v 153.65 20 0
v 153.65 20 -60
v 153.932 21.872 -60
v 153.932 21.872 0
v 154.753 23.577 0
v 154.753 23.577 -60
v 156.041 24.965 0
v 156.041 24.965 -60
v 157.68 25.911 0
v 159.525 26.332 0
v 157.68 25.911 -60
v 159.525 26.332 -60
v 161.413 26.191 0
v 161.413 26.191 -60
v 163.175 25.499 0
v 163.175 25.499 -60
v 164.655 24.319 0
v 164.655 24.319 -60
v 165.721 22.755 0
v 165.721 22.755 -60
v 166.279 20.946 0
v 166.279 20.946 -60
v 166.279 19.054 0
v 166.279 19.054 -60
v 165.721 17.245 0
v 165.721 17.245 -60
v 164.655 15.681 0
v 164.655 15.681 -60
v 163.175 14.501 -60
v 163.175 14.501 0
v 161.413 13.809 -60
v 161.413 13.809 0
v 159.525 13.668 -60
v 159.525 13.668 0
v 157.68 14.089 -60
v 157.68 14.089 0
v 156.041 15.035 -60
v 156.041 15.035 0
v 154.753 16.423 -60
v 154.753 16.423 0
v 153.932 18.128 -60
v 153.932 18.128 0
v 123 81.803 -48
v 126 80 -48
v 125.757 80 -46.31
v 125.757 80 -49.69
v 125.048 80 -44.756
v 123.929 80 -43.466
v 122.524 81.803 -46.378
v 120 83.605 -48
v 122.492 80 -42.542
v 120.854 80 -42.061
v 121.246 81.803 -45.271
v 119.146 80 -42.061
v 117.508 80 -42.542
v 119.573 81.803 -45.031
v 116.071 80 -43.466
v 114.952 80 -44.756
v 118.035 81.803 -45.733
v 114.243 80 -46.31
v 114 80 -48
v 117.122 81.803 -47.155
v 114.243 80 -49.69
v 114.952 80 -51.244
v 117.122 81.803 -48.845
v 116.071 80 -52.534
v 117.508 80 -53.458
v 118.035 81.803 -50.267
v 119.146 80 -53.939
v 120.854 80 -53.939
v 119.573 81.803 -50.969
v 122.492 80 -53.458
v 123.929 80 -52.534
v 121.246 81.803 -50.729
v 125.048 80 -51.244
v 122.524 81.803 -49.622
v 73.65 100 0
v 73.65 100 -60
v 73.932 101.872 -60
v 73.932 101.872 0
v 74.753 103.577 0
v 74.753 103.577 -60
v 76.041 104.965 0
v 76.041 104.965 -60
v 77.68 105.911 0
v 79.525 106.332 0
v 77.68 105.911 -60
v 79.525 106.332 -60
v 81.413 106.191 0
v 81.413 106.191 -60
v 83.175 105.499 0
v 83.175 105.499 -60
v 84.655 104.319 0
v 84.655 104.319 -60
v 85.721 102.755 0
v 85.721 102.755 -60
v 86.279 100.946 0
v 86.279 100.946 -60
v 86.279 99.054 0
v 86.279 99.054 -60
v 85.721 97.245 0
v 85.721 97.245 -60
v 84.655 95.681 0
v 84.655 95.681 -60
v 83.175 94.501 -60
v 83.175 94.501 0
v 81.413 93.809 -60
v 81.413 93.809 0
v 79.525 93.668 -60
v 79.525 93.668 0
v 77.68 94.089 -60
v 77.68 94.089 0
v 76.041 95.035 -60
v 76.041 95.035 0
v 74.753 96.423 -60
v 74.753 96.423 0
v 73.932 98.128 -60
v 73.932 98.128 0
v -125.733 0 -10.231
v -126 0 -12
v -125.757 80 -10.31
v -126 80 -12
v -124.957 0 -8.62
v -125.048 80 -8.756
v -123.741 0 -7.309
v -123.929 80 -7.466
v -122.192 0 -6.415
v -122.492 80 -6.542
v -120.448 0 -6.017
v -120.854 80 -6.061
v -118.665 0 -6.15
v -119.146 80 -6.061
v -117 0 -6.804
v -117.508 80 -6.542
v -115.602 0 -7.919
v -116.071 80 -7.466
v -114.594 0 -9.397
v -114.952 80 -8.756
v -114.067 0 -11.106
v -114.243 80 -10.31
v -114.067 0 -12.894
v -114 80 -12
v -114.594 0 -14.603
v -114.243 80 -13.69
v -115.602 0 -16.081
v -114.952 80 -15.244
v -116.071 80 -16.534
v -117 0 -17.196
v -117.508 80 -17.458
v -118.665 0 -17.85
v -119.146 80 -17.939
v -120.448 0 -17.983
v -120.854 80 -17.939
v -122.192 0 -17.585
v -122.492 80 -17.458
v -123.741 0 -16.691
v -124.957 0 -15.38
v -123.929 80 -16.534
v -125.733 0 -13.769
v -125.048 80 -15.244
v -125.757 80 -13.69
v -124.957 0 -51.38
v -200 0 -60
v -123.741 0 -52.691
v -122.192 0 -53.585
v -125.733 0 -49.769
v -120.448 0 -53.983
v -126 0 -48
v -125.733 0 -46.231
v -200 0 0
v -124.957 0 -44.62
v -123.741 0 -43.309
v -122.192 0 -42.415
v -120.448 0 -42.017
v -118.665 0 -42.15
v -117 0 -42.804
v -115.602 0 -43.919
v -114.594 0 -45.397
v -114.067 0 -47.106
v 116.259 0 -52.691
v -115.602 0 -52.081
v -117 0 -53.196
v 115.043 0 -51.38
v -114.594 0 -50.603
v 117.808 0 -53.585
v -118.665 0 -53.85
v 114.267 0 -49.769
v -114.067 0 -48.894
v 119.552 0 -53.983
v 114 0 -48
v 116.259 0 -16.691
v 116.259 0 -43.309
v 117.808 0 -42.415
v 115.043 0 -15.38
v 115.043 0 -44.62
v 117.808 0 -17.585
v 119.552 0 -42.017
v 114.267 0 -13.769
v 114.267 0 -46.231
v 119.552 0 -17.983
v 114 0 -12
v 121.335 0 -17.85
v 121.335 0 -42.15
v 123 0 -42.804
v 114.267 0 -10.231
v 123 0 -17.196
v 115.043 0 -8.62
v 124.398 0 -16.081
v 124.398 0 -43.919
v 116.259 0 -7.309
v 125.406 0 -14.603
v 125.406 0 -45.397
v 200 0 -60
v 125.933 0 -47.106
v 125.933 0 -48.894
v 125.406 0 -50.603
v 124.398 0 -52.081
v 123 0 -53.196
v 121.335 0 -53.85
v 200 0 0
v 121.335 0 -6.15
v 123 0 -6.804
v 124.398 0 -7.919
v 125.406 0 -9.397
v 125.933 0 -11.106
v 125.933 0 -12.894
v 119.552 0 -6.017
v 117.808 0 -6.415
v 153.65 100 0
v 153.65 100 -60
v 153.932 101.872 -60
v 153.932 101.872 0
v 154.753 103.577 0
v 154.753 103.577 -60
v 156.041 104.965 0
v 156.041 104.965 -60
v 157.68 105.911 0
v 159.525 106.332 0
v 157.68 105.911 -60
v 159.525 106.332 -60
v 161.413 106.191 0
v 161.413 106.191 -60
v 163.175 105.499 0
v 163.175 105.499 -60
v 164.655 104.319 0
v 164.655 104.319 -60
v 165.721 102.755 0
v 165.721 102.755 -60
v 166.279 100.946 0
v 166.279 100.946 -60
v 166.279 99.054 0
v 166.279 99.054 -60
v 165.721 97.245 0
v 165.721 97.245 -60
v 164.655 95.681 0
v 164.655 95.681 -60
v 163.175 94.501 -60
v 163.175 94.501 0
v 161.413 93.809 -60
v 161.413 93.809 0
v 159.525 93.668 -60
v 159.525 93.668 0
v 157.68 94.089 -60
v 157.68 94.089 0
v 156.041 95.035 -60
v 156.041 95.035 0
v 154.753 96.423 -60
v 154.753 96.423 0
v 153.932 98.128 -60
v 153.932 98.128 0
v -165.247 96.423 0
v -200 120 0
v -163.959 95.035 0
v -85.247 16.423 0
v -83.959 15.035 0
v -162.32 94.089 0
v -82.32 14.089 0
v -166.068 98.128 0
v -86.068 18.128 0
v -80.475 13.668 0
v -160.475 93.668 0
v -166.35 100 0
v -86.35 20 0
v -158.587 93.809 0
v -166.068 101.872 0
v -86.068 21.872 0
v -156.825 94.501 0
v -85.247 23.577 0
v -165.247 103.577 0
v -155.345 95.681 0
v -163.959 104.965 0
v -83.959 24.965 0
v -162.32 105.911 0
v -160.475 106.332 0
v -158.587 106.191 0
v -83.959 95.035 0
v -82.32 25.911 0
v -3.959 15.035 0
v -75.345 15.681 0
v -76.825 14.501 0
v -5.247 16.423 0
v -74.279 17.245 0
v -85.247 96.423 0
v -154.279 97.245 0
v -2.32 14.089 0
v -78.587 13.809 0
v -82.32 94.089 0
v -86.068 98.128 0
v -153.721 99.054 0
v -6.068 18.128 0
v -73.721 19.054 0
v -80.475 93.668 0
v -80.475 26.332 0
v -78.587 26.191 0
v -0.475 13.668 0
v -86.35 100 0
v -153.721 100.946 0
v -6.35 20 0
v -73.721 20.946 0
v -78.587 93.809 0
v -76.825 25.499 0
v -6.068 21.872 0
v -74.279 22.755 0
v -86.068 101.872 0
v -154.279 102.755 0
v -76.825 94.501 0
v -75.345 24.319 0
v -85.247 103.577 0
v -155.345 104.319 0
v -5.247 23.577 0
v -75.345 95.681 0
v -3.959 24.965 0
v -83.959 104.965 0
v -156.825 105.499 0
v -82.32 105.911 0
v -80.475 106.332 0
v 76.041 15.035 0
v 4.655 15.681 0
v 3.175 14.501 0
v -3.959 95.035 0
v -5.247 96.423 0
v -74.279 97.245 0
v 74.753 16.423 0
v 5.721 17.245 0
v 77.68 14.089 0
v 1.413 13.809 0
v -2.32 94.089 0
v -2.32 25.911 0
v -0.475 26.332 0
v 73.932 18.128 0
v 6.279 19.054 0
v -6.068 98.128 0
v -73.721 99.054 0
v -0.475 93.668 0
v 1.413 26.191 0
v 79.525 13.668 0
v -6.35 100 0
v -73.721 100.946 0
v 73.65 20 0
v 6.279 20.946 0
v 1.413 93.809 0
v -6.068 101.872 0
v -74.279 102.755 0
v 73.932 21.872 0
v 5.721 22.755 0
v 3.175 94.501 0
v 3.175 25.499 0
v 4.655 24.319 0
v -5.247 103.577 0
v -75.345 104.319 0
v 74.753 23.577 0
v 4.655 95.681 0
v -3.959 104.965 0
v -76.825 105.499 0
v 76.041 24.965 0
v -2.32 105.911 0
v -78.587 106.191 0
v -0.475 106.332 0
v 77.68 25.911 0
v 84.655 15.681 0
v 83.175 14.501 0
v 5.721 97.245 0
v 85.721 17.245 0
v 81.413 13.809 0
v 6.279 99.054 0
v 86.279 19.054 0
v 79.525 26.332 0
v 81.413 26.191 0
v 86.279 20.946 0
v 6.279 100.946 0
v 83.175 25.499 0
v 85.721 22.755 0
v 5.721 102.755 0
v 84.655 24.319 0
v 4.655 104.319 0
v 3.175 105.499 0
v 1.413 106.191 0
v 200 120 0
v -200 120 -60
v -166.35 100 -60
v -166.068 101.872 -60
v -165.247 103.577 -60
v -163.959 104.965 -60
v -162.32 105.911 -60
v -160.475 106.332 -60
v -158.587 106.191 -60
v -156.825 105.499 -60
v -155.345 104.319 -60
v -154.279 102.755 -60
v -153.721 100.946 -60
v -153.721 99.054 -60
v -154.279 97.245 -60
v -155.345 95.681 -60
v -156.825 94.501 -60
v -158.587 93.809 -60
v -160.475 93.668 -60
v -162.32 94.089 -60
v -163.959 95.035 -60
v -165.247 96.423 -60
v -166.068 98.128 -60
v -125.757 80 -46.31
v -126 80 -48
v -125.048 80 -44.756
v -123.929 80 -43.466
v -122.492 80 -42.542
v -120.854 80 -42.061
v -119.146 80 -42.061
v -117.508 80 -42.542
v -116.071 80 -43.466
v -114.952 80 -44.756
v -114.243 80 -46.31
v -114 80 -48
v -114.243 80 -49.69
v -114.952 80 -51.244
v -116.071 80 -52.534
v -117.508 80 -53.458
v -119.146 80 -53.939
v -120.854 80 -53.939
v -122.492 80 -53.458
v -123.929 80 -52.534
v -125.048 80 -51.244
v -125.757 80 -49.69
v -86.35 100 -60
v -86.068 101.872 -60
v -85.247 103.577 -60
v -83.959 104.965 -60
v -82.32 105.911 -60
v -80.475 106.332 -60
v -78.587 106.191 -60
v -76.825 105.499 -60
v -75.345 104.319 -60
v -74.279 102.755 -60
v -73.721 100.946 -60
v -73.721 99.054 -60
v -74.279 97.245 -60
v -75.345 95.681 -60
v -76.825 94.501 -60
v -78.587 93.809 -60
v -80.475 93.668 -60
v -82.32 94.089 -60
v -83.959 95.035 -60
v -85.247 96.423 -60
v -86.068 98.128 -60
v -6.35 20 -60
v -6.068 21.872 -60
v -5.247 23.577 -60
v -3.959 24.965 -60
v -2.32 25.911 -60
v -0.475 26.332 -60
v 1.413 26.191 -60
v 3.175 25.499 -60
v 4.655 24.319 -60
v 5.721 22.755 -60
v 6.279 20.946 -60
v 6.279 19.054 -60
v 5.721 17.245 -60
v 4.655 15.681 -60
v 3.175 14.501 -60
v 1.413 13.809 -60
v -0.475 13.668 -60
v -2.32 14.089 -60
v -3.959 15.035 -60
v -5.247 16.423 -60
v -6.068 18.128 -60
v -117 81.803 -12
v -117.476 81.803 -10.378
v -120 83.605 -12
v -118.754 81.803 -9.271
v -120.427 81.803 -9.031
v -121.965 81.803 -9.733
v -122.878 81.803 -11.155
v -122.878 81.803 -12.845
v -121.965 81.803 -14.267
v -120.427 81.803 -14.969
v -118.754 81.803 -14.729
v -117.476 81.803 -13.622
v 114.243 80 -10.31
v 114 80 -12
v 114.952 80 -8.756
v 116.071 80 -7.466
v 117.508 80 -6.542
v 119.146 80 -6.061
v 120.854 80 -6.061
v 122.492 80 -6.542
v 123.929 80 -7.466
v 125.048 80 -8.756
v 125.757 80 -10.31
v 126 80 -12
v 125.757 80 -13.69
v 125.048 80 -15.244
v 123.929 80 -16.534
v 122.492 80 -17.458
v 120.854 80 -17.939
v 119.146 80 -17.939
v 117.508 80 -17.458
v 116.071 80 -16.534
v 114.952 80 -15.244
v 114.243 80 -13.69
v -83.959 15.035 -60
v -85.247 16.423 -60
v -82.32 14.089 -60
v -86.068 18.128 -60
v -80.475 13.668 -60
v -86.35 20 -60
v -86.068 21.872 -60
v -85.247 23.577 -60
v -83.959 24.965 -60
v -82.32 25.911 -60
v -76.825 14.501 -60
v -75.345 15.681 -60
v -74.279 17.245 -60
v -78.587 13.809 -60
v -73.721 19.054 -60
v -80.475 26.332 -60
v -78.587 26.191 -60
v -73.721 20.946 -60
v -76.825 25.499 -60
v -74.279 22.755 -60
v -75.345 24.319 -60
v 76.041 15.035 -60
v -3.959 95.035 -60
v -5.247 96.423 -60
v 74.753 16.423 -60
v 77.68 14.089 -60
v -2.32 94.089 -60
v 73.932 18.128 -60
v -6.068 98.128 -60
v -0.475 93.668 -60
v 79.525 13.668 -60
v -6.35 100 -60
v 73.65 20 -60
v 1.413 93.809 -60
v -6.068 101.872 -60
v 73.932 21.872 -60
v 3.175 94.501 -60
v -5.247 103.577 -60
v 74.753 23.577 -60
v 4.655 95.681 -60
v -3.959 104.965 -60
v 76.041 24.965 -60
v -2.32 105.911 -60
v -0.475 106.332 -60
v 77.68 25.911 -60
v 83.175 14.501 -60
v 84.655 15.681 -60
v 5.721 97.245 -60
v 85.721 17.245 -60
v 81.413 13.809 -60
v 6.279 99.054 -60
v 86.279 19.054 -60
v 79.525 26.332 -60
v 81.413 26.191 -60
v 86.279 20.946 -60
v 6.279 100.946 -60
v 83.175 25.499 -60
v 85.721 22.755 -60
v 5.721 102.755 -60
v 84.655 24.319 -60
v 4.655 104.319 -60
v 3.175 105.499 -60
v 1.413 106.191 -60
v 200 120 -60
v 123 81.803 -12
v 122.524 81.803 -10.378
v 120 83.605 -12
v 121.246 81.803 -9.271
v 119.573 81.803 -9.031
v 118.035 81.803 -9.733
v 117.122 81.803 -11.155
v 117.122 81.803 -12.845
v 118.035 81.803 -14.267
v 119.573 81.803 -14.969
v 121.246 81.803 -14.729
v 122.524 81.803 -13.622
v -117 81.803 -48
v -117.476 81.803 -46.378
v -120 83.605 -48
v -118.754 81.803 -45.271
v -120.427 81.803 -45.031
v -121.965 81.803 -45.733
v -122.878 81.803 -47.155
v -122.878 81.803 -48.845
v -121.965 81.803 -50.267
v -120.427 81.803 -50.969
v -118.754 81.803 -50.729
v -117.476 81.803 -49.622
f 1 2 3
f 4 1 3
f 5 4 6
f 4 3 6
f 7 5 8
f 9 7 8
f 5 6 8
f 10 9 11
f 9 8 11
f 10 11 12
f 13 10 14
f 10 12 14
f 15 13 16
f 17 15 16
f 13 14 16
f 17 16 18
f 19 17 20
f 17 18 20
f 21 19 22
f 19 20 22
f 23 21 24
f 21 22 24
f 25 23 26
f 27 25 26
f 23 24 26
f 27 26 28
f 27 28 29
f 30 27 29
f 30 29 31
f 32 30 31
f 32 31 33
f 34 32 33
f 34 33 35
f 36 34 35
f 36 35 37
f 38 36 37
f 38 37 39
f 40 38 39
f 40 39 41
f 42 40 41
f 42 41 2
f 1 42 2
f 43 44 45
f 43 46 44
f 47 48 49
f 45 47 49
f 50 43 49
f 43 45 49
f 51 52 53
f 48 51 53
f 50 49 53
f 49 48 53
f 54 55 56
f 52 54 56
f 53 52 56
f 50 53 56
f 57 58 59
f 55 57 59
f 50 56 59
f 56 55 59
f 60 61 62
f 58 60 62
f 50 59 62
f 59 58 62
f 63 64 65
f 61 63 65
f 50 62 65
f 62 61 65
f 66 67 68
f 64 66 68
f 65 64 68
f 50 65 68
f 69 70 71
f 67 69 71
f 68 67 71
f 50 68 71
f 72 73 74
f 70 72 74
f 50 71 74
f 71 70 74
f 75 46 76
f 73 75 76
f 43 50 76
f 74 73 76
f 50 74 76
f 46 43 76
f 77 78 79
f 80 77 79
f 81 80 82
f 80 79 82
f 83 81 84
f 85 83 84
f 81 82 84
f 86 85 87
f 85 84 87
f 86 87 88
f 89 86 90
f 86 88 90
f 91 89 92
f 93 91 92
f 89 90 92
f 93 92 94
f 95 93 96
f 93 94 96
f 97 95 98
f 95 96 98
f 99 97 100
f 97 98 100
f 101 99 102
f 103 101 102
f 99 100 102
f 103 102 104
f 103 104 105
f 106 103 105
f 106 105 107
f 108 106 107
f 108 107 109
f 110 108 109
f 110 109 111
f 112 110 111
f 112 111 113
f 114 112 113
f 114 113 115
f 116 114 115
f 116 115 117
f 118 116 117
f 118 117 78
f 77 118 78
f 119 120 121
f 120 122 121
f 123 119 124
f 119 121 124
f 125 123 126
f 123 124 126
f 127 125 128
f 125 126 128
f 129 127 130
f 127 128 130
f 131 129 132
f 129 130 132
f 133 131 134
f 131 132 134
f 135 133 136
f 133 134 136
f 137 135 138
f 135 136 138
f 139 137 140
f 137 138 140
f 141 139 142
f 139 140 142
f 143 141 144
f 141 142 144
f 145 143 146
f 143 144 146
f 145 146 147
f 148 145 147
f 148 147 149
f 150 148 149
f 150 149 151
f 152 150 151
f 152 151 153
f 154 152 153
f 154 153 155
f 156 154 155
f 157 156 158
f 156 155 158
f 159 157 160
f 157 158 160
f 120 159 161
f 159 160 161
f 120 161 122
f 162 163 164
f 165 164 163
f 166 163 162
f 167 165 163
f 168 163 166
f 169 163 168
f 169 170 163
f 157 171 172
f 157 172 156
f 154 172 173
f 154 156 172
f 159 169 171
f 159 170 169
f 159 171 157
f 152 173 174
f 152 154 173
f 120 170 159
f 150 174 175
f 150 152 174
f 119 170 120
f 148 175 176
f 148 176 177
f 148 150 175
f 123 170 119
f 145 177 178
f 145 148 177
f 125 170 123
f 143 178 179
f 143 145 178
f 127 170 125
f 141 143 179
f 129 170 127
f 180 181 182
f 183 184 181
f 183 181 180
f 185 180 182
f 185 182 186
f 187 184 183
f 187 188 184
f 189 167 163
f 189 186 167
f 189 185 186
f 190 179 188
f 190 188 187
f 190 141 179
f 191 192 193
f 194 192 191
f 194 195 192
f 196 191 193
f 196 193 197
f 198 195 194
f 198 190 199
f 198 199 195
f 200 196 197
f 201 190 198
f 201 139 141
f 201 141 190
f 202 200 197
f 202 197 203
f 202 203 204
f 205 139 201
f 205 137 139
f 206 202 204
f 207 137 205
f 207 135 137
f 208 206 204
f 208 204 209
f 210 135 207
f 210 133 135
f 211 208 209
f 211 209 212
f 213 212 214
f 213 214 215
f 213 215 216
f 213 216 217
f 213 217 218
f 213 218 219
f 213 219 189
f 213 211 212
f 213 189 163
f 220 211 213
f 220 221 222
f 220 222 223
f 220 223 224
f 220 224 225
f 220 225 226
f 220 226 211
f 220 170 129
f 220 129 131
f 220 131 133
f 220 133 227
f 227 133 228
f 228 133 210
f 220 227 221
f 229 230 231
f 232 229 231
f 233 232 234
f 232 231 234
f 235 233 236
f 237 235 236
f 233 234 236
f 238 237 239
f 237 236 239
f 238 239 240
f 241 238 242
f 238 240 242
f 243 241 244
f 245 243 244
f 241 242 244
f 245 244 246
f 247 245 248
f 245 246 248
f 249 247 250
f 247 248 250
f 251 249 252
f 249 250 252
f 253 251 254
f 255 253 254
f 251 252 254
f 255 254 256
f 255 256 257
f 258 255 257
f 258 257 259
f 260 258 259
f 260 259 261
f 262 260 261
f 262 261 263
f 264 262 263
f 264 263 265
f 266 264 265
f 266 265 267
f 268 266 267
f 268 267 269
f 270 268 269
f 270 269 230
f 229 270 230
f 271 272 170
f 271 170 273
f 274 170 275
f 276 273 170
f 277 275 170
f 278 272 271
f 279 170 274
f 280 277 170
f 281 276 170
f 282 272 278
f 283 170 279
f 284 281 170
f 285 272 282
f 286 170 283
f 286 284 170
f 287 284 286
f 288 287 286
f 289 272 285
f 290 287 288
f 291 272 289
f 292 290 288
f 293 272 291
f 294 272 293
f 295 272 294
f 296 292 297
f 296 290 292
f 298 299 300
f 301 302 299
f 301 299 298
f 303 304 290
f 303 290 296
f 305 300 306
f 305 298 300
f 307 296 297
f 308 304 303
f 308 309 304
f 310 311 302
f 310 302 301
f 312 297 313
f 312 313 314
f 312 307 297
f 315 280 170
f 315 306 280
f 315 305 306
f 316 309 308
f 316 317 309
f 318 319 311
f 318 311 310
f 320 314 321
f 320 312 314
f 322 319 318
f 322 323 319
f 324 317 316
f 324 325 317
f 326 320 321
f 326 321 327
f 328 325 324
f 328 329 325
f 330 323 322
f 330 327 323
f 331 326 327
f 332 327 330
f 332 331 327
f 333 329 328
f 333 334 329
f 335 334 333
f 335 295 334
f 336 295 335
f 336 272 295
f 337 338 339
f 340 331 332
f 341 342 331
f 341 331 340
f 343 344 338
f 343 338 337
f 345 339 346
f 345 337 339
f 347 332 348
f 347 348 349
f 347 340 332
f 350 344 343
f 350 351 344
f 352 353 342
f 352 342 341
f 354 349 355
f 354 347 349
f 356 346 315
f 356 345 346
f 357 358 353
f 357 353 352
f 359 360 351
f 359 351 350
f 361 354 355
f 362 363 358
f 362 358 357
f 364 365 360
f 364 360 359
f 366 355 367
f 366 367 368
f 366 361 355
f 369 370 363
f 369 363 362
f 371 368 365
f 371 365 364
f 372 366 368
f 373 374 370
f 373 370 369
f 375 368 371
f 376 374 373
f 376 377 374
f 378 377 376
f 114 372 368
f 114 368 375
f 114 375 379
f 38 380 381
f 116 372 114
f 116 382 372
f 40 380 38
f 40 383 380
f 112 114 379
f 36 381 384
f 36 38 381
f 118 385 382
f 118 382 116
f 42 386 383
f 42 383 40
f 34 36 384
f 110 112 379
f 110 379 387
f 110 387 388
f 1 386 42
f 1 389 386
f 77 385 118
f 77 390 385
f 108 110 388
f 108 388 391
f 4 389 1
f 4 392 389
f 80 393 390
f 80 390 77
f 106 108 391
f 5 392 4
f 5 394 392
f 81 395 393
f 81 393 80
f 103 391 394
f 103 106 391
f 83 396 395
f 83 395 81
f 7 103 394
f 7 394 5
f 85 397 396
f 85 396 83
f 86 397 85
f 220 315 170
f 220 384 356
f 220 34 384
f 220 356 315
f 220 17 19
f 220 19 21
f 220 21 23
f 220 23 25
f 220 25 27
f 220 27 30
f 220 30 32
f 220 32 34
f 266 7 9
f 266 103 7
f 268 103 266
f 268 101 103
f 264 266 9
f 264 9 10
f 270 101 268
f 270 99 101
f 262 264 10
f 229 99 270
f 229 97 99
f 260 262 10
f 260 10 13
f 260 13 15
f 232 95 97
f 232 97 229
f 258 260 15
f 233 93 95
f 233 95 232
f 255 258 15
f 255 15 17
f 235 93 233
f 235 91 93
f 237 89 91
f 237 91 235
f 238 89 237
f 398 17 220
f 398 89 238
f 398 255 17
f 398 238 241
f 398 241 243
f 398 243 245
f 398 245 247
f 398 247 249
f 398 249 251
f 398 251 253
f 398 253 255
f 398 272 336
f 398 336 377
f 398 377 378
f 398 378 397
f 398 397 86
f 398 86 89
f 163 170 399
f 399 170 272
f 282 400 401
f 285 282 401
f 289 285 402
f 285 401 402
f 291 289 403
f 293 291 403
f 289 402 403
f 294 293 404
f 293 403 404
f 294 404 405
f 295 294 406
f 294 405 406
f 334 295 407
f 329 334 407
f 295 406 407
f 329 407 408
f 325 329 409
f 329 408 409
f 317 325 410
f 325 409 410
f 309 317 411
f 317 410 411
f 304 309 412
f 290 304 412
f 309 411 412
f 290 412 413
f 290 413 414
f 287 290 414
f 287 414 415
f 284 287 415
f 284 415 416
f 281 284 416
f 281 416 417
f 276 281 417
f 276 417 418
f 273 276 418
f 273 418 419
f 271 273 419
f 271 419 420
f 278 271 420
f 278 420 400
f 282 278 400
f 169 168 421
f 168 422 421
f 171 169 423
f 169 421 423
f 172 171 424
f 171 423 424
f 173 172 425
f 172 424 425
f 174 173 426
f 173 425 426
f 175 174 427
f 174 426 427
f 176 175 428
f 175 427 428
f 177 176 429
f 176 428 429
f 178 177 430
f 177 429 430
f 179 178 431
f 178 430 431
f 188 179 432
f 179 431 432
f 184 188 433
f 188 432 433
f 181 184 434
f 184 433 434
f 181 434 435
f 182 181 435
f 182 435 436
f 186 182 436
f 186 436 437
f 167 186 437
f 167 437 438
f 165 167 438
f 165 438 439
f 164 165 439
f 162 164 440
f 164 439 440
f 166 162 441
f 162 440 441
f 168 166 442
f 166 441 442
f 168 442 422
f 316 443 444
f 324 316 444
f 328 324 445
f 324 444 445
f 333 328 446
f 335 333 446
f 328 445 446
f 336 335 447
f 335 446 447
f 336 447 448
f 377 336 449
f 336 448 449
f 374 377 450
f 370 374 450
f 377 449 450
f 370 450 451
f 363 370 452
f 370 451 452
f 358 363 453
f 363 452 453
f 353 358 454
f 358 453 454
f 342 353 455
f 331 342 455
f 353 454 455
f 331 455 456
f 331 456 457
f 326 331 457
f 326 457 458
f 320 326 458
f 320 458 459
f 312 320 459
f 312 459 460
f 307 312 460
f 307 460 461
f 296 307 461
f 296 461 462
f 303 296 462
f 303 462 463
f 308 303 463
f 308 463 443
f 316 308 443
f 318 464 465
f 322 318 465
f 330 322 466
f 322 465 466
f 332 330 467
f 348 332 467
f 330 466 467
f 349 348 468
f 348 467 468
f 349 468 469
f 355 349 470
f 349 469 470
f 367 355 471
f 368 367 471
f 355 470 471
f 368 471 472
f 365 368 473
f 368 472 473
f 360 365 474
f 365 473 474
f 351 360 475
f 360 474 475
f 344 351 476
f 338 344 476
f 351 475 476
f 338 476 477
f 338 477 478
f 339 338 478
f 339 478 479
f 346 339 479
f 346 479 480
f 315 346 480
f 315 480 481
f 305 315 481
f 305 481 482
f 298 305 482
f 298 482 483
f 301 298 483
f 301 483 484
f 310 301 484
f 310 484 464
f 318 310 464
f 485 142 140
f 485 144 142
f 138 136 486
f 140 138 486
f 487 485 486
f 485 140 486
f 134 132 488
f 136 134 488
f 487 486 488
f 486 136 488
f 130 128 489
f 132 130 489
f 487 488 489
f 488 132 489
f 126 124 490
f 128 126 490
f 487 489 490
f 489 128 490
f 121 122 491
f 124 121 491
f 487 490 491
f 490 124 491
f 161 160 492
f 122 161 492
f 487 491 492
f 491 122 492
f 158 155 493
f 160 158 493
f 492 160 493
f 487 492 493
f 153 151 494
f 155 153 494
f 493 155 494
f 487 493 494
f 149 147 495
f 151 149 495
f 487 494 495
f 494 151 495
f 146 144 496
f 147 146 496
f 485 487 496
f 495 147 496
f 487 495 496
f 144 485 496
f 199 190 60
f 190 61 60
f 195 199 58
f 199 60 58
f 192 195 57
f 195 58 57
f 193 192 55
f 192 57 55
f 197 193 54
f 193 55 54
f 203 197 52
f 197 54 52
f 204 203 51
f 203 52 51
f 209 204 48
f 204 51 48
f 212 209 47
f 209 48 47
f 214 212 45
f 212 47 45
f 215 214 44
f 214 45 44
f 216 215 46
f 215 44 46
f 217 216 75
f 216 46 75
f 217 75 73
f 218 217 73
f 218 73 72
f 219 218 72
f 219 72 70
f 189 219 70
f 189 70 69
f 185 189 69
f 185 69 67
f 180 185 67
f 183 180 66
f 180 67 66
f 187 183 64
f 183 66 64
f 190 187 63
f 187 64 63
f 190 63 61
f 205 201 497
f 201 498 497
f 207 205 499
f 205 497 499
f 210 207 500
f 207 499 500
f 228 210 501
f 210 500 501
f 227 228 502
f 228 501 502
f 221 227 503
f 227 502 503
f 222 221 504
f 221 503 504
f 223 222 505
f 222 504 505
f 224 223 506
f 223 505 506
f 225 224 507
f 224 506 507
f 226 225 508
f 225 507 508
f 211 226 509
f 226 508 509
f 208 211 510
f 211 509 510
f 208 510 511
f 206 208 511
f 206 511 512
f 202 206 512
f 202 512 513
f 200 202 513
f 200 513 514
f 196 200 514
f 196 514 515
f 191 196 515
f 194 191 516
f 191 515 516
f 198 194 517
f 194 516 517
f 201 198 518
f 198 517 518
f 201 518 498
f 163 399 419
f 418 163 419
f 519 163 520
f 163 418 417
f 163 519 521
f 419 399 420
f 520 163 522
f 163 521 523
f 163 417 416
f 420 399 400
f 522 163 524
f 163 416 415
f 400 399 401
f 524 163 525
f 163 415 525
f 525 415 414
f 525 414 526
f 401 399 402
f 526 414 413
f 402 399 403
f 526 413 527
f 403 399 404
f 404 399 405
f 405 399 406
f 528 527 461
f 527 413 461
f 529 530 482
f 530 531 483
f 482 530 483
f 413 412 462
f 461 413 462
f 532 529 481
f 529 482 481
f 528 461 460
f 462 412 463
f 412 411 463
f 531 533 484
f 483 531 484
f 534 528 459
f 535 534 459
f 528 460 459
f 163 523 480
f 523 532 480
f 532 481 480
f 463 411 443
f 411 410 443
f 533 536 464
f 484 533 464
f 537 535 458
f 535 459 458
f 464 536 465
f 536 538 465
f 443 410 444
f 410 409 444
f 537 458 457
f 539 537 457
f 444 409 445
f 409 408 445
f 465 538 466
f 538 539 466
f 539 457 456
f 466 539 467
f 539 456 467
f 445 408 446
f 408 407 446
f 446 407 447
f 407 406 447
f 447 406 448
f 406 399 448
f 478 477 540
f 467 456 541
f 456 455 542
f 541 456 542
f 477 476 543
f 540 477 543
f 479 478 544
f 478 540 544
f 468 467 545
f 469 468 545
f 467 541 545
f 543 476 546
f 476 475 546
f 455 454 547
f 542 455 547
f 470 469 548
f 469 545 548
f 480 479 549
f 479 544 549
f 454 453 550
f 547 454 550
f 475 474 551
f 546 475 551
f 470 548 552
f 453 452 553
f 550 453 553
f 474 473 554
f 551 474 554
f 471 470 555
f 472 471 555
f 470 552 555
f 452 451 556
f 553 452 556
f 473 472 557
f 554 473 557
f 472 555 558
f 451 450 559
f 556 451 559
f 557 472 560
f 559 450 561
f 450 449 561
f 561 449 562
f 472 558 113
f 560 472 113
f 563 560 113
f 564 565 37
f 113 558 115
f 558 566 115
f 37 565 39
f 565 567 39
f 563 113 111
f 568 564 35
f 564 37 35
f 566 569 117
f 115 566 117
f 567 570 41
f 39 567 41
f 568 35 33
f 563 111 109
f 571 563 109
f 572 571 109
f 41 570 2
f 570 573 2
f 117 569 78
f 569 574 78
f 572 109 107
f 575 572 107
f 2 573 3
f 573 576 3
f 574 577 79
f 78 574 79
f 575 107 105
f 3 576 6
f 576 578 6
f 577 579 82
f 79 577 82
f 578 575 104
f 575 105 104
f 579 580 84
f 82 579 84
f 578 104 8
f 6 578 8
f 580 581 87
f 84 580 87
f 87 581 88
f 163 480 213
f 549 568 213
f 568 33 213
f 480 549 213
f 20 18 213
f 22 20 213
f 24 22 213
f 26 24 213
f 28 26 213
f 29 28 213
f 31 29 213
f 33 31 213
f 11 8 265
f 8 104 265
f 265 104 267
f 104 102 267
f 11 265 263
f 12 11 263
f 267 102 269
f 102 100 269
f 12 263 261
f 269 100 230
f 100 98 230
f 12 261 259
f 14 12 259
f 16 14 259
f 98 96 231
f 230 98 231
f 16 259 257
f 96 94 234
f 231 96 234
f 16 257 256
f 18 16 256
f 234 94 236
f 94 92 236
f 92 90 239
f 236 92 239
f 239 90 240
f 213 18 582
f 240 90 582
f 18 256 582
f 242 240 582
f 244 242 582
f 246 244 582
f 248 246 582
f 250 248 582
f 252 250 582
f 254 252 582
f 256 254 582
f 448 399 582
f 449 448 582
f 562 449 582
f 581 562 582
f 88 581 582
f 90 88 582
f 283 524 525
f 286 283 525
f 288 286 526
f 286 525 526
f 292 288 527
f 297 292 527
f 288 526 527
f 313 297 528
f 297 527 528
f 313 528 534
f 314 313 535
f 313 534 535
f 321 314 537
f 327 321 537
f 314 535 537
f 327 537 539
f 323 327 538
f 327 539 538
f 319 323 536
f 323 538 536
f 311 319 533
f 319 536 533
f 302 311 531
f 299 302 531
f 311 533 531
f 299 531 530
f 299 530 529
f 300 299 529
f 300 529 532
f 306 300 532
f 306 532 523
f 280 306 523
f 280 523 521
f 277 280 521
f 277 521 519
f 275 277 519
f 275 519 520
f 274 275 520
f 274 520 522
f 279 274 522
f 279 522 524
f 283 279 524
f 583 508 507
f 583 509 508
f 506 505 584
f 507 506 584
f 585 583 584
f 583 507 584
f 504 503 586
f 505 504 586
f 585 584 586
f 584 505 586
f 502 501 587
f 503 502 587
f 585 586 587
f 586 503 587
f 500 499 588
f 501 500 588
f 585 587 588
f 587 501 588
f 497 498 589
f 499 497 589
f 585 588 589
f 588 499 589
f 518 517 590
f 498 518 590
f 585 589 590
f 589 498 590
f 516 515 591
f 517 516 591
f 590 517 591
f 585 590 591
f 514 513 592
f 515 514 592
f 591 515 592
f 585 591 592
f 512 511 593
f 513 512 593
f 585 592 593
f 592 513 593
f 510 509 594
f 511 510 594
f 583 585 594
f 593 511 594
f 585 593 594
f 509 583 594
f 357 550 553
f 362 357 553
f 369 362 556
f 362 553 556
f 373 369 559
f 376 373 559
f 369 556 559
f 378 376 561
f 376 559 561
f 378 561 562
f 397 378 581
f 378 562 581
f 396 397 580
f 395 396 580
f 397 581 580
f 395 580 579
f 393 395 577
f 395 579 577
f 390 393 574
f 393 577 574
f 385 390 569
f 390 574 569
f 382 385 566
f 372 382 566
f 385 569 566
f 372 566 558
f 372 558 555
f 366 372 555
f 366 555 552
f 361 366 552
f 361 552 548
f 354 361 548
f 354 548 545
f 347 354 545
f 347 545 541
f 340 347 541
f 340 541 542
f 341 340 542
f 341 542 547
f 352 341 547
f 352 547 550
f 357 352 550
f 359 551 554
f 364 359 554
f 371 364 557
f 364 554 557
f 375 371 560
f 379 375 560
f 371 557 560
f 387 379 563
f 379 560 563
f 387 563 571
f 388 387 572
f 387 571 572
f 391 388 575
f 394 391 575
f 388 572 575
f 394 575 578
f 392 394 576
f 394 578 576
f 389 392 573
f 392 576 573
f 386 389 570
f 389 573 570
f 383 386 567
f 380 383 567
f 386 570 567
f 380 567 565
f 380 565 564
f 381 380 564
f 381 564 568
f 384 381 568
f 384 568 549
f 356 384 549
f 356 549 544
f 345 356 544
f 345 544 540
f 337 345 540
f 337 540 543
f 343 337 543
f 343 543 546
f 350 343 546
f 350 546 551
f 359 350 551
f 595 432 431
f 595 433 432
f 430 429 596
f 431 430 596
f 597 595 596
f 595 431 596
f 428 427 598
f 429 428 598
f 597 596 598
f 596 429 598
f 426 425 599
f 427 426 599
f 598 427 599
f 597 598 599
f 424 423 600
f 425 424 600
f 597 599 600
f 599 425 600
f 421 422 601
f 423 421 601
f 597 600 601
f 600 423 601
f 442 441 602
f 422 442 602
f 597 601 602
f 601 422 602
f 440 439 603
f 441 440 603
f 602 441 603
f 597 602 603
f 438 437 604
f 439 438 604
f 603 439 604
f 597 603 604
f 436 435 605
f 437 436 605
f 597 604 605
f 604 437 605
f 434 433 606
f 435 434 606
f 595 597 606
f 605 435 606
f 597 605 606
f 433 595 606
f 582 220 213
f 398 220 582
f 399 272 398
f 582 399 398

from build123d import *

# Parameters (mm, degrees)
F0_W     = 400
F0_H     = 120
F0_R     = 12.7
F0_R_2   = 6.35
F1_DEPTH = 60
F3_D     = 12
F3_DEPTH = 80
F3_TIP   = 3.6051637142
F4_D     = 12.7


with BuildPart() as f1:
    # F0 (on Top) → F1 (new body)
    with BuildSketch(Plane.XY):
        with Locations((0, 60)):
            Rectangle(F0_W, F0_H)
        with Locations((-80, 20)):
            Circle(F0_R, mode=Mode.SUBTRACT)
        with Locations((0, 20)):
            Circle(F0_R, mode=Mode.SUBTRACT)
        with Locations((80, 20)):
            Circle(F0_R, mode=Mode.SUBTRACT)
        with Locations((160, 20)):
            Circle(F0_R, mode=Mode.SUBTRACT)
        with Locations((-160, 100)):
            Circle(F0_R, mode=Mode.SUBTRACT)
        with Locations((-80, 100)):
            Circle(F0_R, mode=Mode.SUBTRACT)
        with Locations((0, 100)):
            Circle(F0_R, mode=Mode.SUBTRACT)
        with Locations((80, 100)):
            Circle(F0_R, mode=Mode.SUBTRACT)
        with Locations((160, 100)):
            Circle(F0_R, mode=Mode.SUBTRACT)
        with Locations((-160, 100)):
            Circle(F0_R)
        with Locations((-160, 100)):
            Circle(F0_R_2, mode=Mode.SUBTRACT)
        with Locations((-80, 100)):
            Circle(F0_R)
        with Locations((-80, 100)):
            Circle(F0_R_2, mode=Mode.SUBTRACT)
        with Locations((0, 100)):
            Circle(F0_R)
        with Locations((0, 100)):
            Circle(F0_R_2, mode=Mode.SUBTRACT)
        with Locations((80, 100)):
            Circle(F0_R)
        with Locations((80, 100)):
            Circle(F0_R_2, mode=Mode.SUBTRACT)
        with Locations((160, 100)):
            Circle(F0_R)
        with Locations((160, 100)):
            Circle(F0_R_2, mode=Mode.SUBTRACT)
        with Locations((80, 20)):
            Circle(F0_R)
        with Locations((80, 20)):
            Circle(F0_R_2, mode=Mode.SUBTRACT)
        with Locations((160, 20)):
            Circle(F0_R)
        with Locations((160, 20)):
            Circle(F0_R_2, mode=Mode.SUBTRACT)
        with Locations((0, 20)):
            Circle(F0_R)
        with Locations((0, 20)):
            Circle(F0_R_2, mode=Mode.SUBTRACT)
        with Locations((-80, 20)):
            Circle(F0_R)
        with Locations((-80, 20)):
            Circle(F0_R_2, mode=Mode.SUBTRACT)
        with Locations((-160, 100)):
            Circle(F0_R_2)
        with Locations((-80, 100)):
            Circle(F0_R_2)
        with Locations((0, 100)):
            Circle(F0_R_2)
        with Locations((80, 100)):
            Circle(F0_R_2)
        with Locations((160, 100)):
            Circle(F0_R_2)
        with Locations((80, 20)):
            Circle(F0_R_2)
        with Locations((160, 20)):
            Circle(F0_R_2)
        with Locations((0, 20)):
            Circle(F0_R_2)
        with Locations((-80, 20)):
            Circle(F0_R_2)
    extrude(amount=-F1_DEPTH)

    # F3
    with Locations(Plane.XZ):
        with Locations((-120, -12), (-120, -48), (120, -48), (120, -12)):
            Hole(F3_D / 2, depth=F3_DEPTH)
            with Locations((0, 0, -(F3_DEPTH + F3_TIP / 2))):  # 118° drill point
                Cone(0, F3_D / 2, F3_TIP, mode=Mode.SUBTRACT)

    # F4 (through all)
    with Locations(Plane.XY):
        with Locations((-80, 20), (-80, 100), (-160, 100), (0, 100), (0, 20), (80, 20), (80, 100), (160, 100), (160, 20)):
            Hole(F4_D / 2)


solid = f1.part
